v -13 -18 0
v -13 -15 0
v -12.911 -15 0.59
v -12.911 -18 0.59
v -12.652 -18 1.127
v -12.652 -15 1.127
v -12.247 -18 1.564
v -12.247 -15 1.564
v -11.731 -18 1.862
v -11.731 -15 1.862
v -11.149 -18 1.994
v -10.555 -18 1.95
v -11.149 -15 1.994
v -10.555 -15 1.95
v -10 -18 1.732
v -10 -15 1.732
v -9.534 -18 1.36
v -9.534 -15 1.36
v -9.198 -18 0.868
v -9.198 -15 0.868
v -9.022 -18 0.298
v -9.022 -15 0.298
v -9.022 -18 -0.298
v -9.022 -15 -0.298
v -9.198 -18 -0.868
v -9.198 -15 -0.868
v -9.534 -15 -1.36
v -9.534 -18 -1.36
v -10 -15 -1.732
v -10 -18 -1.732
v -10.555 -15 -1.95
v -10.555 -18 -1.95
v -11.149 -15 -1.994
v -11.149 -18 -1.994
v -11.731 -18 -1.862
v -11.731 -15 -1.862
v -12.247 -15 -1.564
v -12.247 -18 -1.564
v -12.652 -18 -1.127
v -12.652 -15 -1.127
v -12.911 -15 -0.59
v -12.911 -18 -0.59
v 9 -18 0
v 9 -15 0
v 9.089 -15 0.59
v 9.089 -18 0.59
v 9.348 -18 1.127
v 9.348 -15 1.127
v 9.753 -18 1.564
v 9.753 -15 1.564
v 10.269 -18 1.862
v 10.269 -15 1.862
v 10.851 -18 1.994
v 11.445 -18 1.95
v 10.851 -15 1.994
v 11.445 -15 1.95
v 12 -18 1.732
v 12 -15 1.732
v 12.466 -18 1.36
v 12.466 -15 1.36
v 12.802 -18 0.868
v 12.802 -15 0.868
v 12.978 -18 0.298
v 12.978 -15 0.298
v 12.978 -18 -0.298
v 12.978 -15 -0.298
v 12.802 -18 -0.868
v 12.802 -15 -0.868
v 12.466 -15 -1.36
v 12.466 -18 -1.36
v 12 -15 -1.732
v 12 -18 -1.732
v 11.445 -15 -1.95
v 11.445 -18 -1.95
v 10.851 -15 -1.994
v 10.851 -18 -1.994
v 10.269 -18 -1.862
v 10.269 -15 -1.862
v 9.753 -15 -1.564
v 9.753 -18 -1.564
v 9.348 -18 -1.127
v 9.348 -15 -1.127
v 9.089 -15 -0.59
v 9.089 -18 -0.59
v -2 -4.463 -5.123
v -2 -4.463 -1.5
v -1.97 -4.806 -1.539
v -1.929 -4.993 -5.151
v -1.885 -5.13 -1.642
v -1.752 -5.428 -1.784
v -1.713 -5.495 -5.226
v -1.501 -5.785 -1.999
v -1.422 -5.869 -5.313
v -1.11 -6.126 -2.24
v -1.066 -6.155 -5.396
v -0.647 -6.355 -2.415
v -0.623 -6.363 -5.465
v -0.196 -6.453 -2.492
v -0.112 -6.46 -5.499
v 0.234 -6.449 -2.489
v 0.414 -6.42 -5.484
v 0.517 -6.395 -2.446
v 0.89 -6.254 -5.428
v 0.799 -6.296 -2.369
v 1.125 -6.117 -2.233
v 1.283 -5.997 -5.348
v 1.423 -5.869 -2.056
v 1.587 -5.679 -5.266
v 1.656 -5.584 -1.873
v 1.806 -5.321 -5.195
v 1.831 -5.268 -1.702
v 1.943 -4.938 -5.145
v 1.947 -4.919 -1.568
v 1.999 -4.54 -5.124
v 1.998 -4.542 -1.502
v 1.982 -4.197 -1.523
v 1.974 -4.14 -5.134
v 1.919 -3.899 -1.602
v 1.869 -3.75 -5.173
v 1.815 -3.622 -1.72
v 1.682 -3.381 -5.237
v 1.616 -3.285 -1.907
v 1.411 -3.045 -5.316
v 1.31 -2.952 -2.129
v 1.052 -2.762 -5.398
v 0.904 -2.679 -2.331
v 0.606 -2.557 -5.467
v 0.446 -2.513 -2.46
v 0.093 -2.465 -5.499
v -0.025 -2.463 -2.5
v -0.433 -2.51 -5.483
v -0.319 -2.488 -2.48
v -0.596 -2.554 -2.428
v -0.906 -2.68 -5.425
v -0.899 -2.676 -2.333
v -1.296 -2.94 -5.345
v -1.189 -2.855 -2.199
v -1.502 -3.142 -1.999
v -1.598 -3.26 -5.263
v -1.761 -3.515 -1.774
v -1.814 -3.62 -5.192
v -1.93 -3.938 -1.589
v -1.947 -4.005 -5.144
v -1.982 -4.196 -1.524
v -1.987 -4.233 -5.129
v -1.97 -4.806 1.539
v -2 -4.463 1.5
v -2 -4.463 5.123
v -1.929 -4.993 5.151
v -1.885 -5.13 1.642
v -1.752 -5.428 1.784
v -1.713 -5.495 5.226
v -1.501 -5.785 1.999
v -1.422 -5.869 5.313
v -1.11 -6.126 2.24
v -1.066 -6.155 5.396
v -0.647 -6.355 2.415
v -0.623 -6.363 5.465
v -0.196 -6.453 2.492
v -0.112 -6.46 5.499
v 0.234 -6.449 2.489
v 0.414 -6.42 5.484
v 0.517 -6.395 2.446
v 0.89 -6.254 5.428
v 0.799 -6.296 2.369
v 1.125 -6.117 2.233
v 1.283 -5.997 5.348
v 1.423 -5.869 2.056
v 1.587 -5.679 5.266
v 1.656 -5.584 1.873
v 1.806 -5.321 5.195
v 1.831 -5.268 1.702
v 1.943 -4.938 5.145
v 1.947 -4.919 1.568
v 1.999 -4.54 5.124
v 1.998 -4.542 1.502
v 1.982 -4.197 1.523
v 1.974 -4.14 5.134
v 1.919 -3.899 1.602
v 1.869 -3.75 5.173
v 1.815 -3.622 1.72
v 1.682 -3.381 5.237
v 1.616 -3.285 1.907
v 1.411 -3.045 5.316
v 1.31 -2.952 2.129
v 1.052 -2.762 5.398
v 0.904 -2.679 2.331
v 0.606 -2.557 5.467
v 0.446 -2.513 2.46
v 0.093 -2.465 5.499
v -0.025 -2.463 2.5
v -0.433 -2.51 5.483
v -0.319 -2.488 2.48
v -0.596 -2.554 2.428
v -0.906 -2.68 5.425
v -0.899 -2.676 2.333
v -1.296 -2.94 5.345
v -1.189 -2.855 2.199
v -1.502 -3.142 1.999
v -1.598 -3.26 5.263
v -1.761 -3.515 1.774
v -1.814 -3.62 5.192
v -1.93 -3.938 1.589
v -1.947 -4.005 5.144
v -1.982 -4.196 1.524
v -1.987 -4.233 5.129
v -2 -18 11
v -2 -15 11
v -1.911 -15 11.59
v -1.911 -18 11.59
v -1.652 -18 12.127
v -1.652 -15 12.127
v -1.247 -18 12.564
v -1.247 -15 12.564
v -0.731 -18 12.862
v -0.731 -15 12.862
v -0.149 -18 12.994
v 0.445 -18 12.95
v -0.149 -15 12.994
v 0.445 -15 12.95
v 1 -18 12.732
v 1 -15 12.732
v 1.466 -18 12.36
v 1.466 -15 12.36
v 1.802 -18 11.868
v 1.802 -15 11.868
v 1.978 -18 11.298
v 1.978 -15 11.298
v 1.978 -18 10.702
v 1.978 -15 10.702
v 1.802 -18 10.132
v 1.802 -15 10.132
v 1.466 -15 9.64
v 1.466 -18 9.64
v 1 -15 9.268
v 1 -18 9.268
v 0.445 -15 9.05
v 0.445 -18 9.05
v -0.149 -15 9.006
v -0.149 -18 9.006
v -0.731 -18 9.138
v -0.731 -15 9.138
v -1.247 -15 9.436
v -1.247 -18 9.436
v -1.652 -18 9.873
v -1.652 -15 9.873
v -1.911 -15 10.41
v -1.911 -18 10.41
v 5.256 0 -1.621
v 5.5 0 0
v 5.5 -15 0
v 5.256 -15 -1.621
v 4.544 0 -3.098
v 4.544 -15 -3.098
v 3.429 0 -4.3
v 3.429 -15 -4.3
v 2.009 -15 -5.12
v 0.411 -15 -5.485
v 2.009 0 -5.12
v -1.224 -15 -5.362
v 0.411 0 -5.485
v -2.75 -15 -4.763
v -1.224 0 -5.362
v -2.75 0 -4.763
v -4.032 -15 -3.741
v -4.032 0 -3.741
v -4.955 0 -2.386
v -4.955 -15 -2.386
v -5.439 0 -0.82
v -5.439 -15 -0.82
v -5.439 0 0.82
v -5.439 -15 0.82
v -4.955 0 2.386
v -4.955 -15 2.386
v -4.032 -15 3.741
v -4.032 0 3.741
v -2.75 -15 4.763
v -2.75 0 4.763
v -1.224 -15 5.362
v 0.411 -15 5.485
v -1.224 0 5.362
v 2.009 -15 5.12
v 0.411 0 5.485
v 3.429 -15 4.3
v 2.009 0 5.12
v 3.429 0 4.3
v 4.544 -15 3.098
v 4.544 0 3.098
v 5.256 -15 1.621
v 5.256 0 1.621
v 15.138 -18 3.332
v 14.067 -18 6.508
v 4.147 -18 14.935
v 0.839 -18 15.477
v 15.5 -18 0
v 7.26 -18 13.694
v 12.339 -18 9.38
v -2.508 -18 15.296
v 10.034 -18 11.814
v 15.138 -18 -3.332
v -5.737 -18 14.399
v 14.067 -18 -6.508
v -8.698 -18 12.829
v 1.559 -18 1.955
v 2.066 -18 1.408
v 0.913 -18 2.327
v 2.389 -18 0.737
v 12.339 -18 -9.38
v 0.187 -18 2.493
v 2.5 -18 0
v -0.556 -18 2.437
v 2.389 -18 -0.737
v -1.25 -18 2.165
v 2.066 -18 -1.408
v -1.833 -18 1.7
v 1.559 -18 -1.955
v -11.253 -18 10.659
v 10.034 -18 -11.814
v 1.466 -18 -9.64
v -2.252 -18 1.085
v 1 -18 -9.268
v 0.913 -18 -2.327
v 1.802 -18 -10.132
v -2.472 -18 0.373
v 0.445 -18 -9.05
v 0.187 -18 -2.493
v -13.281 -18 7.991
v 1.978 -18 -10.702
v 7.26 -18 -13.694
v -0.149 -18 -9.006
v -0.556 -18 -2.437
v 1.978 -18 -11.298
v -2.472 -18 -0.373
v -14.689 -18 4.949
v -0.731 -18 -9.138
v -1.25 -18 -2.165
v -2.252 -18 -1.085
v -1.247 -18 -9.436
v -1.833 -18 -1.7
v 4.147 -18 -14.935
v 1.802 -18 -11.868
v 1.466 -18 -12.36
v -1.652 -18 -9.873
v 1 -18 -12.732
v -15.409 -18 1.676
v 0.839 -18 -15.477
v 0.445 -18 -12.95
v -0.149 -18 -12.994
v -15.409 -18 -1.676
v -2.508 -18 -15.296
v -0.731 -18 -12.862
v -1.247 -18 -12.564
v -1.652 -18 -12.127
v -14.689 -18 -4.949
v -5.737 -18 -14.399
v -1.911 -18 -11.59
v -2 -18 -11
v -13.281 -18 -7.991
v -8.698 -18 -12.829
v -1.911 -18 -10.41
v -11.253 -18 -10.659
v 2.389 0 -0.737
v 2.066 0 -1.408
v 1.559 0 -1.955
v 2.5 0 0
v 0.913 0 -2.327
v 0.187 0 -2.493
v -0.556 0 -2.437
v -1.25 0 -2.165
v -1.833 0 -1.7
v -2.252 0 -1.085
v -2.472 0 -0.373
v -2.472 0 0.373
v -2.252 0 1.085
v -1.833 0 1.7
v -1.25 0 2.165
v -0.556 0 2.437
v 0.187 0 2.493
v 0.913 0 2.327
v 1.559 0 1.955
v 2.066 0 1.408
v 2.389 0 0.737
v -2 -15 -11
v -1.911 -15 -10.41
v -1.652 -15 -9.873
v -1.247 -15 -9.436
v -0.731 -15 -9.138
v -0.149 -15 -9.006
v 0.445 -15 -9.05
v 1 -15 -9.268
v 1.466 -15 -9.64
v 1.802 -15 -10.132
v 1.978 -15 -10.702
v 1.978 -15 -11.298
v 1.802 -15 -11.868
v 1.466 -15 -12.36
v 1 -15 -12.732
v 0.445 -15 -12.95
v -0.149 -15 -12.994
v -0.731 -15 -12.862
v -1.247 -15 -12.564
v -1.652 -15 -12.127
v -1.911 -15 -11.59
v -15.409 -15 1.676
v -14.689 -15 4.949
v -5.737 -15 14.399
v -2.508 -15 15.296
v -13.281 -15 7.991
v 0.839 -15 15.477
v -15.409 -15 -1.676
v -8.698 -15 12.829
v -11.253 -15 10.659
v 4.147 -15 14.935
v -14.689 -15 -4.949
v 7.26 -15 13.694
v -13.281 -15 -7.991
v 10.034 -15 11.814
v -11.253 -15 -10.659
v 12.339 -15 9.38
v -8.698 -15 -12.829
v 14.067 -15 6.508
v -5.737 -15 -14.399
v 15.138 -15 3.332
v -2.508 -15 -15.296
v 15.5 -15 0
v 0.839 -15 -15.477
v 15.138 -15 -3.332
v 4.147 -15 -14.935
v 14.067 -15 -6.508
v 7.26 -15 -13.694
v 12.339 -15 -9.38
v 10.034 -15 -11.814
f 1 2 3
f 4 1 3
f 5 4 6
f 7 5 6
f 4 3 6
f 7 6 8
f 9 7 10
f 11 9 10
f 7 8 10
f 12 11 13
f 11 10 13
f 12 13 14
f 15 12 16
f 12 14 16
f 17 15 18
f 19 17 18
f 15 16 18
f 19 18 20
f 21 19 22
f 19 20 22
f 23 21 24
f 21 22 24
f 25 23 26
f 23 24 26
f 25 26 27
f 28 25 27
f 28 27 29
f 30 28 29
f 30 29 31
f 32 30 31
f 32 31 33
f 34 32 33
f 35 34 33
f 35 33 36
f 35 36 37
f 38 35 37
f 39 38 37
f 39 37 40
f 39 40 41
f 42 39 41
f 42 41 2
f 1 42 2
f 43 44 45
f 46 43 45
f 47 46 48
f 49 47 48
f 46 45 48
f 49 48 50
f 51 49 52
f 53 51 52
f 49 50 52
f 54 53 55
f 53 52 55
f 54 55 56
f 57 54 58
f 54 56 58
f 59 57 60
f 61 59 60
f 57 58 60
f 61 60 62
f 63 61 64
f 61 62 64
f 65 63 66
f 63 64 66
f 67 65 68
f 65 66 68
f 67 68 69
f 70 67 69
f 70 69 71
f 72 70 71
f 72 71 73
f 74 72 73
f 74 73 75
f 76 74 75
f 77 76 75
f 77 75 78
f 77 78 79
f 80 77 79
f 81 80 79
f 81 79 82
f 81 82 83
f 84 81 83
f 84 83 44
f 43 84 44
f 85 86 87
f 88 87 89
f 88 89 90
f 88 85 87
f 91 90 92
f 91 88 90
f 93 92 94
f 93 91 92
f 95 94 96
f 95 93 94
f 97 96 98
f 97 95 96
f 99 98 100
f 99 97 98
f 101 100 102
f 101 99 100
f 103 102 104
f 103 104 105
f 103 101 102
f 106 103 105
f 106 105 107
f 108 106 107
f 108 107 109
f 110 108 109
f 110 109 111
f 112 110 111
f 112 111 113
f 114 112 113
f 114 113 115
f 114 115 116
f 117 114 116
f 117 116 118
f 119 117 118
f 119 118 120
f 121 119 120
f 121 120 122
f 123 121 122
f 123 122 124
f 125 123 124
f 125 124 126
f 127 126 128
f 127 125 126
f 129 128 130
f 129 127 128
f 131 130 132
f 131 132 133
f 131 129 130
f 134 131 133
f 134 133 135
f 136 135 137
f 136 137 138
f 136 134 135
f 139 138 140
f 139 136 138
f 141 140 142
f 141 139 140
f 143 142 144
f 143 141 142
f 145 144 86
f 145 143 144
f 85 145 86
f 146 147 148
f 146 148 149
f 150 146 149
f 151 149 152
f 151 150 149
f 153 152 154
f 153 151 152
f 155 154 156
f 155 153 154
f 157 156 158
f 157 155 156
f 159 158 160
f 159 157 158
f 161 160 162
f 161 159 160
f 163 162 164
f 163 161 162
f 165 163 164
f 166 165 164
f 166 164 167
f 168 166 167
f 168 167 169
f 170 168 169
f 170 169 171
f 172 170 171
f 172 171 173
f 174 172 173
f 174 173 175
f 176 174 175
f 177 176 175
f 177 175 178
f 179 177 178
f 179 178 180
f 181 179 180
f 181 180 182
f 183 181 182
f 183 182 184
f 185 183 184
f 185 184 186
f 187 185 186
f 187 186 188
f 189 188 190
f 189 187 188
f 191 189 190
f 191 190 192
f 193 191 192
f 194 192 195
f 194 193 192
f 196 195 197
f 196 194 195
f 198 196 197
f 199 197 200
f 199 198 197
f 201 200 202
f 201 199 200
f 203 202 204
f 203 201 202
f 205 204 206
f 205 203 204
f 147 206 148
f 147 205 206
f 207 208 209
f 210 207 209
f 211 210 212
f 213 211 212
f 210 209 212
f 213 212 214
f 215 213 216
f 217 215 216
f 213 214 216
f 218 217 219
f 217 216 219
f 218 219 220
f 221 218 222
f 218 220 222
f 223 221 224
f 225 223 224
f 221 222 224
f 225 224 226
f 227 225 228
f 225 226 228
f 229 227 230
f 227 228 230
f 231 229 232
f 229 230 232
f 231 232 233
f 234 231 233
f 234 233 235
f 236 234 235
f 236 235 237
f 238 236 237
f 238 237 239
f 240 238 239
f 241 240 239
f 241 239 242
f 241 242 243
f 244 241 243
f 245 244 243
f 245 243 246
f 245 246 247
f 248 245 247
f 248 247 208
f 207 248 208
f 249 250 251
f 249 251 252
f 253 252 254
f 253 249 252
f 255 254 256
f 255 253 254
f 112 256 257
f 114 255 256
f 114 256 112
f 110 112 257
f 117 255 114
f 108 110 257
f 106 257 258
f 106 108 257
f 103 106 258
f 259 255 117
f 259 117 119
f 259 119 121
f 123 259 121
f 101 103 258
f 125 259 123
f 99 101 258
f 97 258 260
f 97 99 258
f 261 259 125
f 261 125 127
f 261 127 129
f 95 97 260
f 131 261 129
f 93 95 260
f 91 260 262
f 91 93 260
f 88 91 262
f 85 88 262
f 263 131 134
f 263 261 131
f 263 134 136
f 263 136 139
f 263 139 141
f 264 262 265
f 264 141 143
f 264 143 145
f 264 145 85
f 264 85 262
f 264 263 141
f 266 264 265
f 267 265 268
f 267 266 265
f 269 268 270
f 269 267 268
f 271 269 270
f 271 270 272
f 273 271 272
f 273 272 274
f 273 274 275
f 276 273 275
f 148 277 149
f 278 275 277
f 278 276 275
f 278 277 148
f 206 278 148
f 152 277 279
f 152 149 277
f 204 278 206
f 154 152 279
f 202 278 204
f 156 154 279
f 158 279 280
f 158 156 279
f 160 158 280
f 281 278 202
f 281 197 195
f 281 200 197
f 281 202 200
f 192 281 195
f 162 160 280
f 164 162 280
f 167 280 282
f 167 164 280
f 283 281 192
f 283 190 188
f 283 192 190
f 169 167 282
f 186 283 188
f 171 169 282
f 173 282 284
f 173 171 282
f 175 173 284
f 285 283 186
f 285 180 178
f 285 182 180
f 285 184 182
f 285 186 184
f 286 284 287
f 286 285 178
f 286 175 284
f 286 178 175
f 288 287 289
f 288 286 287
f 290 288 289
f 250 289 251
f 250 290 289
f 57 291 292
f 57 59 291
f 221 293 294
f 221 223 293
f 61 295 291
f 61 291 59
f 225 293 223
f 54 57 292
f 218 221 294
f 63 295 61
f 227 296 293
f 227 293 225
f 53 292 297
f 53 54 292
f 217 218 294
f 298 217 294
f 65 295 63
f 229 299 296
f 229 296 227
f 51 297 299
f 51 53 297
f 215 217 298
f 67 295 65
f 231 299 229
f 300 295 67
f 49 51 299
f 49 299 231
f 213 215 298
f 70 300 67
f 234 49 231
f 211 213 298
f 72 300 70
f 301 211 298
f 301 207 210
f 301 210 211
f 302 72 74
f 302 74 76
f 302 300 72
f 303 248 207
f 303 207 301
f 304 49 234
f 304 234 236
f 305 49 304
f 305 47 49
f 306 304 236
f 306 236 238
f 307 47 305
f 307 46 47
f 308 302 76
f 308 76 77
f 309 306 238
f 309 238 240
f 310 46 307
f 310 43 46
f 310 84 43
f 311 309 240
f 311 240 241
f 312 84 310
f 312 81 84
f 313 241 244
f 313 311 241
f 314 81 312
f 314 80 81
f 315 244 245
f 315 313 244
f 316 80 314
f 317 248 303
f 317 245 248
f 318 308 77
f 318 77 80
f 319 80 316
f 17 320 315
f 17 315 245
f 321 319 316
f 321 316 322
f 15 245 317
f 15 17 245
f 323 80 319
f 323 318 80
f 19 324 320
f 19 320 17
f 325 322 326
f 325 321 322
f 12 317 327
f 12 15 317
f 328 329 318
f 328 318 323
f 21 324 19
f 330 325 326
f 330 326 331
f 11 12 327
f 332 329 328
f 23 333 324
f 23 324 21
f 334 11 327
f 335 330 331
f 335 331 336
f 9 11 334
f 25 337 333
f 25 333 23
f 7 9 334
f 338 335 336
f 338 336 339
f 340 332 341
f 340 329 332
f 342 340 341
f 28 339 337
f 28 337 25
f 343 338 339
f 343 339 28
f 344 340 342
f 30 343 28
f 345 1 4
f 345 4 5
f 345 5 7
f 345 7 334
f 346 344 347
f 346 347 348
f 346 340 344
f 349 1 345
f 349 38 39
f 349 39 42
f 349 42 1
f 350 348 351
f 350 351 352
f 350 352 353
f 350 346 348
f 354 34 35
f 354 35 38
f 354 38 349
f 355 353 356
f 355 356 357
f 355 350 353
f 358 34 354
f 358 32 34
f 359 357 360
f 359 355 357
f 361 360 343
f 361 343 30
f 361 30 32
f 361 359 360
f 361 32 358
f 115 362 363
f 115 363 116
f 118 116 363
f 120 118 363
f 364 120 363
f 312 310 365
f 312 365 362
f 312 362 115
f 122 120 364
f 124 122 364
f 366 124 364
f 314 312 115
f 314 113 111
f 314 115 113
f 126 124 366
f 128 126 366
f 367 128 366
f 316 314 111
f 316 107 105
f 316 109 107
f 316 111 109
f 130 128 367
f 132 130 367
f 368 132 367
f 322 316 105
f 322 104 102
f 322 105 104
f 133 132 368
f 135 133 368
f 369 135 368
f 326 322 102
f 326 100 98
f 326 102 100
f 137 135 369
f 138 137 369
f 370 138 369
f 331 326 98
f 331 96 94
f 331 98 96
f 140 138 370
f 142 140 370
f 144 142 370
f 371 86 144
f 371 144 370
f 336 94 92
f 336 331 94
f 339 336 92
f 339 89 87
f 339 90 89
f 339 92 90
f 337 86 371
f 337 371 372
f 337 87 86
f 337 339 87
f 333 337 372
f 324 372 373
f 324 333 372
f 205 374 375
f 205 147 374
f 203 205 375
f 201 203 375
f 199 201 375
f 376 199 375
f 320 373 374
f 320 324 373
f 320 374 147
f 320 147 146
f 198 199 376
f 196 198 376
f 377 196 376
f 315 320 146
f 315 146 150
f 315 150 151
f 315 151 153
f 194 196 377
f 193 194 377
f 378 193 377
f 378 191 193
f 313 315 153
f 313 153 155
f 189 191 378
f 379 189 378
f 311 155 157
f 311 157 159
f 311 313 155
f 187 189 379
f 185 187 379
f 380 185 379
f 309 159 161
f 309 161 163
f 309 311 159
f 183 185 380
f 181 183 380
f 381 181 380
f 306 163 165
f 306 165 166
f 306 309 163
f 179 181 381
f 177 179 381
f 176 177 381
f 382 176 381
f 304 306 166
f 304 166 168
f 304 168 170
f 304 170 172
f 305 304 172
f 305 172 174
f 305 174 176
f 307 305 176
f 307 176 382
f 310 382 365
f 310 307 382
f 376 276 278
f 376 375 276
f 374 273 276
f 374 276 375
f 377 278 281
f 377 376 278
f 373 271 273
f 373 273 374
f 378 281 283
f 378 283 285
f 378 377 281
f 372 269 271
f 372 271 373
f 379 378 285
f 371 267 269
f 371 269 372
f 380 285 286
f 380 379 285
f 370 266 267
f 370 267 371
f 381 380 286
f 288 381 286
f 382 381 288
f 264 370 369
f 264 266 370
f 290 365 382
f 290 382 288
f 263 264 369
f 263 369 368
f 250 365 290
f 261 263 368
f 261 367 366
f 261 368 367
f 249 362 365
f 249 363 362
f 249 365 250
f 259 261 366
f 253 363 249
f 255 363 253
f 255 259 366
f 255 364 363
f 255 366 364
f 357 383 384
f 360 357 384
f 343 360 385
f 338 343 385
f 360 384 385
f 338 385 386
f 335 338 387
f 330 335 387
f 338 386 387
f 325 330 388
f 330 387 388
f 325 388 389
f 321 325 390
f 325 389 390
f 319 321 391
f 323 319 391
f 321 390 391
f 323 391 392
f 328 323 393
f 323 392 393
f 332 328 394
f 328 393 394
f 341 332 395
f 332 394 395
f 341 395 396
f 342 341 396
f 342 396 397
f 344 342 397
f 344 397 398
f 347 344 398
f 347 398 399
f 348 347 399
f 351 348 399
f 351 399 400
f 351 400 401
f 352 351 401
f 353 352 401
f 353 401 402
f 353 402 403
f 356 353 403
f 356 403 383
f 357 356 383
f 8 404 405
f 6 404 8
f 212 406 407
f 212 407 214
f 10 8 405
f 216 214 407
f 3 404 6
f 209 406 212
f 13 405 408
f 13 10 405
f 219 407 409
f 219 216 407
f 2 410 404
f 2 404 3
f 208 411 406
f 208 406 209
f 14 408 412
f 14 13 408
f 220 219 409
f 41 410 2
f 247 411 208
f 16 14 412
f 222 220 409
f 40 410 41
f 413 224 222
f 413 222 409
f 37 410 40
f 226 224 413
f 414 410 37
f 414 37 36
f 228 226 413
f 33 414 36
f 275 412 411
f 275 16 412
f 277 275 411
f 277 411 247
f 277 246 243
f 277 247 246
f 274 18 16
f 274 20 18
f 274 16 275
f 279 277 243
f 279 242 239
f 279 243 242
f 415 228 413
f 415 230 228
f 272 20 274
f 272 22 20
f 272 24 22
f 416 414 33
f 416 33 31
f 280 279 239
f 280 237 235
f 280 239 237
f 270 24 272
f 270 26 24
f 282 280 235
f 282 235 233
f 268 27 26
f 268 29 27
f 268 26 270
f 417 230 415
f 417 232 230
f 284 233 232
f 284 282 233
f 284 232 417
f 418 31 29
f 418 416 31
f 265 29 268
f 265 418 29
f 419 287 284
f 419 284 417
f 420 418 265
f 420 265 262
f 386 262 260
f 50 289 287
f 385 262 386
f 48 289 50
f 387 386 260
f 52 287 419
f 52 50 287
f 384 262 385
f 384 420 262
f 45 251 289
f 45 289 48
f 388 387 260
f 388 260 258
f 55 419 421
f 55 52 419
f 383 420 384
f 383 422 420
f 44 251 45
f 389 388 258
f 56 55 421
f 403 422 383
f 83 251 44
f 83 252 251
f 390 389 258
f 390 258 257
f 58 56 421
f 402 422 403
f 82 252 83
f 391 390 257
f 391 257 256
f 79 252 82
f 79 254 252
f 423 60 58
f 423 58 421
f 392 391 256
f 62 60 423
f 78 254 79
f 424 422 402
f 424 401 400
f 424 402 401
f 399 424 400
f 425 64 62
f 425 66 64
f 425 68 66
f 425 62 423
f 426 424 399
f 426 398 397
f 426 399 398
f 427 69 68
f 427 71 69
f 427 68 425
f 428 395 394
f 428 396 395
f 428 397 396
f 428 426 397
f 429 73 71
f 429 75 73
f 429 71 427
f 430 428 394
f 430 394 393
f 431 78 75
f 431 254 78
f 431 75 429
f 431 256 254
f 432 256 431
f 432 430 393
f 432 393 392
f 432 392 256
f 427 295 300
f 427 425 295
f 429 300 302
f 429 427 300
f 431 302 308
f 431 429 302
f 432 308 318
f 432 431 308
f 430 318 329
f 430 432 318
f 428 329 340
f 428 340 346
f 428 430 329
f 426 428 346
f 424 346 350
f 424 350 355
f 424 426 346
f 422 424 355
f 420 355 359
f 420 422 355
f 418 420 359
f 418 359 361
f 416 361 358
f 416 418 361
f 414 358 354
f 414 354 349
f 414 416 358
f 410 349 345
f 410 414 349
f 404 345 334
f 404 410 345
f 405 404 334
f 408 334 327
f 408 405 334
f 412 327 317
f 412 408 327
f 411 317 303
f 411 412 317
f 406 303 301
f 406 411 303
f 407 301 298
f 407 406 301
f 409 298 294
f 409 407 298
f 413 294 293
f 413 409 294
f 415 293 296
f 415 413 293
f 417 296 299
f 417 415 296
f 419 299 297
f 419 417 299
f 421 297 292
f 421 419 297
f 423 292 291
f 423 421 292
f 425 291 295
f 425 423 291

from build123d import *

# Parameters (mm, degrees)
CUT_EXTRUDE1_DEPTH      = 10
CUT_EXTRUDE1_DEPTH_BACK = 10
SKETCH2_R               = 2
SKETCH3_R               = 2
CUT_EXTRUDE2_DEPTH      = 10


with BuildPart() as part:
    # Sketch1 → Revolve1 (revolve)
    with BuildSketch(Plane.XY):
        Polygon((-2.5, 0), (-2.5, -18), (-15.5, -18), (-15.5, -15), (-5.5, -15), (-5.5, 0), align=None)
    revolve(axis=Axis((0, -76.950705693, 0), (0, 1, 0)))

    # Sketch2 → Cut-Extrude1 (cut, two sides: drawn at the far end of the back side and taken through both)
    with BuildSketch(Plane.XY.offset(-CUT_EXTRUDE1_DEPTH_BACK)):
        with Locations((0, -4.46288306)):
            Circle(SKETCH2_R)
    extrude(amount=CUT_EXTRUDE1_DEPTH + CUT_EXTRUDE1_DEPTH_BACK, mode=Mode.SUBTRACT)

    # Sketch3 → Cut-Extrude2 (cut)
    with BuildSketch(Plane(origin=(0, -15, 0), x_dir=(1, 0, 0), z_dir=(0, 1, 0))):
        with Locations((0, 11)):
            Circle(SKETCH3_R)
        with Locations((11, 0)):
            Circle(SKETCH3_R)
        with Locations((0, -11)):
            Circle(SKETCH3_R)
        with Locations((-11, 0)):
            Circle(SKETCH3_R)
    extrude(amount=-CUT_EXTRUDE2_DEPTH, mode=Mode.SUBTRACT)


solid = part.part
